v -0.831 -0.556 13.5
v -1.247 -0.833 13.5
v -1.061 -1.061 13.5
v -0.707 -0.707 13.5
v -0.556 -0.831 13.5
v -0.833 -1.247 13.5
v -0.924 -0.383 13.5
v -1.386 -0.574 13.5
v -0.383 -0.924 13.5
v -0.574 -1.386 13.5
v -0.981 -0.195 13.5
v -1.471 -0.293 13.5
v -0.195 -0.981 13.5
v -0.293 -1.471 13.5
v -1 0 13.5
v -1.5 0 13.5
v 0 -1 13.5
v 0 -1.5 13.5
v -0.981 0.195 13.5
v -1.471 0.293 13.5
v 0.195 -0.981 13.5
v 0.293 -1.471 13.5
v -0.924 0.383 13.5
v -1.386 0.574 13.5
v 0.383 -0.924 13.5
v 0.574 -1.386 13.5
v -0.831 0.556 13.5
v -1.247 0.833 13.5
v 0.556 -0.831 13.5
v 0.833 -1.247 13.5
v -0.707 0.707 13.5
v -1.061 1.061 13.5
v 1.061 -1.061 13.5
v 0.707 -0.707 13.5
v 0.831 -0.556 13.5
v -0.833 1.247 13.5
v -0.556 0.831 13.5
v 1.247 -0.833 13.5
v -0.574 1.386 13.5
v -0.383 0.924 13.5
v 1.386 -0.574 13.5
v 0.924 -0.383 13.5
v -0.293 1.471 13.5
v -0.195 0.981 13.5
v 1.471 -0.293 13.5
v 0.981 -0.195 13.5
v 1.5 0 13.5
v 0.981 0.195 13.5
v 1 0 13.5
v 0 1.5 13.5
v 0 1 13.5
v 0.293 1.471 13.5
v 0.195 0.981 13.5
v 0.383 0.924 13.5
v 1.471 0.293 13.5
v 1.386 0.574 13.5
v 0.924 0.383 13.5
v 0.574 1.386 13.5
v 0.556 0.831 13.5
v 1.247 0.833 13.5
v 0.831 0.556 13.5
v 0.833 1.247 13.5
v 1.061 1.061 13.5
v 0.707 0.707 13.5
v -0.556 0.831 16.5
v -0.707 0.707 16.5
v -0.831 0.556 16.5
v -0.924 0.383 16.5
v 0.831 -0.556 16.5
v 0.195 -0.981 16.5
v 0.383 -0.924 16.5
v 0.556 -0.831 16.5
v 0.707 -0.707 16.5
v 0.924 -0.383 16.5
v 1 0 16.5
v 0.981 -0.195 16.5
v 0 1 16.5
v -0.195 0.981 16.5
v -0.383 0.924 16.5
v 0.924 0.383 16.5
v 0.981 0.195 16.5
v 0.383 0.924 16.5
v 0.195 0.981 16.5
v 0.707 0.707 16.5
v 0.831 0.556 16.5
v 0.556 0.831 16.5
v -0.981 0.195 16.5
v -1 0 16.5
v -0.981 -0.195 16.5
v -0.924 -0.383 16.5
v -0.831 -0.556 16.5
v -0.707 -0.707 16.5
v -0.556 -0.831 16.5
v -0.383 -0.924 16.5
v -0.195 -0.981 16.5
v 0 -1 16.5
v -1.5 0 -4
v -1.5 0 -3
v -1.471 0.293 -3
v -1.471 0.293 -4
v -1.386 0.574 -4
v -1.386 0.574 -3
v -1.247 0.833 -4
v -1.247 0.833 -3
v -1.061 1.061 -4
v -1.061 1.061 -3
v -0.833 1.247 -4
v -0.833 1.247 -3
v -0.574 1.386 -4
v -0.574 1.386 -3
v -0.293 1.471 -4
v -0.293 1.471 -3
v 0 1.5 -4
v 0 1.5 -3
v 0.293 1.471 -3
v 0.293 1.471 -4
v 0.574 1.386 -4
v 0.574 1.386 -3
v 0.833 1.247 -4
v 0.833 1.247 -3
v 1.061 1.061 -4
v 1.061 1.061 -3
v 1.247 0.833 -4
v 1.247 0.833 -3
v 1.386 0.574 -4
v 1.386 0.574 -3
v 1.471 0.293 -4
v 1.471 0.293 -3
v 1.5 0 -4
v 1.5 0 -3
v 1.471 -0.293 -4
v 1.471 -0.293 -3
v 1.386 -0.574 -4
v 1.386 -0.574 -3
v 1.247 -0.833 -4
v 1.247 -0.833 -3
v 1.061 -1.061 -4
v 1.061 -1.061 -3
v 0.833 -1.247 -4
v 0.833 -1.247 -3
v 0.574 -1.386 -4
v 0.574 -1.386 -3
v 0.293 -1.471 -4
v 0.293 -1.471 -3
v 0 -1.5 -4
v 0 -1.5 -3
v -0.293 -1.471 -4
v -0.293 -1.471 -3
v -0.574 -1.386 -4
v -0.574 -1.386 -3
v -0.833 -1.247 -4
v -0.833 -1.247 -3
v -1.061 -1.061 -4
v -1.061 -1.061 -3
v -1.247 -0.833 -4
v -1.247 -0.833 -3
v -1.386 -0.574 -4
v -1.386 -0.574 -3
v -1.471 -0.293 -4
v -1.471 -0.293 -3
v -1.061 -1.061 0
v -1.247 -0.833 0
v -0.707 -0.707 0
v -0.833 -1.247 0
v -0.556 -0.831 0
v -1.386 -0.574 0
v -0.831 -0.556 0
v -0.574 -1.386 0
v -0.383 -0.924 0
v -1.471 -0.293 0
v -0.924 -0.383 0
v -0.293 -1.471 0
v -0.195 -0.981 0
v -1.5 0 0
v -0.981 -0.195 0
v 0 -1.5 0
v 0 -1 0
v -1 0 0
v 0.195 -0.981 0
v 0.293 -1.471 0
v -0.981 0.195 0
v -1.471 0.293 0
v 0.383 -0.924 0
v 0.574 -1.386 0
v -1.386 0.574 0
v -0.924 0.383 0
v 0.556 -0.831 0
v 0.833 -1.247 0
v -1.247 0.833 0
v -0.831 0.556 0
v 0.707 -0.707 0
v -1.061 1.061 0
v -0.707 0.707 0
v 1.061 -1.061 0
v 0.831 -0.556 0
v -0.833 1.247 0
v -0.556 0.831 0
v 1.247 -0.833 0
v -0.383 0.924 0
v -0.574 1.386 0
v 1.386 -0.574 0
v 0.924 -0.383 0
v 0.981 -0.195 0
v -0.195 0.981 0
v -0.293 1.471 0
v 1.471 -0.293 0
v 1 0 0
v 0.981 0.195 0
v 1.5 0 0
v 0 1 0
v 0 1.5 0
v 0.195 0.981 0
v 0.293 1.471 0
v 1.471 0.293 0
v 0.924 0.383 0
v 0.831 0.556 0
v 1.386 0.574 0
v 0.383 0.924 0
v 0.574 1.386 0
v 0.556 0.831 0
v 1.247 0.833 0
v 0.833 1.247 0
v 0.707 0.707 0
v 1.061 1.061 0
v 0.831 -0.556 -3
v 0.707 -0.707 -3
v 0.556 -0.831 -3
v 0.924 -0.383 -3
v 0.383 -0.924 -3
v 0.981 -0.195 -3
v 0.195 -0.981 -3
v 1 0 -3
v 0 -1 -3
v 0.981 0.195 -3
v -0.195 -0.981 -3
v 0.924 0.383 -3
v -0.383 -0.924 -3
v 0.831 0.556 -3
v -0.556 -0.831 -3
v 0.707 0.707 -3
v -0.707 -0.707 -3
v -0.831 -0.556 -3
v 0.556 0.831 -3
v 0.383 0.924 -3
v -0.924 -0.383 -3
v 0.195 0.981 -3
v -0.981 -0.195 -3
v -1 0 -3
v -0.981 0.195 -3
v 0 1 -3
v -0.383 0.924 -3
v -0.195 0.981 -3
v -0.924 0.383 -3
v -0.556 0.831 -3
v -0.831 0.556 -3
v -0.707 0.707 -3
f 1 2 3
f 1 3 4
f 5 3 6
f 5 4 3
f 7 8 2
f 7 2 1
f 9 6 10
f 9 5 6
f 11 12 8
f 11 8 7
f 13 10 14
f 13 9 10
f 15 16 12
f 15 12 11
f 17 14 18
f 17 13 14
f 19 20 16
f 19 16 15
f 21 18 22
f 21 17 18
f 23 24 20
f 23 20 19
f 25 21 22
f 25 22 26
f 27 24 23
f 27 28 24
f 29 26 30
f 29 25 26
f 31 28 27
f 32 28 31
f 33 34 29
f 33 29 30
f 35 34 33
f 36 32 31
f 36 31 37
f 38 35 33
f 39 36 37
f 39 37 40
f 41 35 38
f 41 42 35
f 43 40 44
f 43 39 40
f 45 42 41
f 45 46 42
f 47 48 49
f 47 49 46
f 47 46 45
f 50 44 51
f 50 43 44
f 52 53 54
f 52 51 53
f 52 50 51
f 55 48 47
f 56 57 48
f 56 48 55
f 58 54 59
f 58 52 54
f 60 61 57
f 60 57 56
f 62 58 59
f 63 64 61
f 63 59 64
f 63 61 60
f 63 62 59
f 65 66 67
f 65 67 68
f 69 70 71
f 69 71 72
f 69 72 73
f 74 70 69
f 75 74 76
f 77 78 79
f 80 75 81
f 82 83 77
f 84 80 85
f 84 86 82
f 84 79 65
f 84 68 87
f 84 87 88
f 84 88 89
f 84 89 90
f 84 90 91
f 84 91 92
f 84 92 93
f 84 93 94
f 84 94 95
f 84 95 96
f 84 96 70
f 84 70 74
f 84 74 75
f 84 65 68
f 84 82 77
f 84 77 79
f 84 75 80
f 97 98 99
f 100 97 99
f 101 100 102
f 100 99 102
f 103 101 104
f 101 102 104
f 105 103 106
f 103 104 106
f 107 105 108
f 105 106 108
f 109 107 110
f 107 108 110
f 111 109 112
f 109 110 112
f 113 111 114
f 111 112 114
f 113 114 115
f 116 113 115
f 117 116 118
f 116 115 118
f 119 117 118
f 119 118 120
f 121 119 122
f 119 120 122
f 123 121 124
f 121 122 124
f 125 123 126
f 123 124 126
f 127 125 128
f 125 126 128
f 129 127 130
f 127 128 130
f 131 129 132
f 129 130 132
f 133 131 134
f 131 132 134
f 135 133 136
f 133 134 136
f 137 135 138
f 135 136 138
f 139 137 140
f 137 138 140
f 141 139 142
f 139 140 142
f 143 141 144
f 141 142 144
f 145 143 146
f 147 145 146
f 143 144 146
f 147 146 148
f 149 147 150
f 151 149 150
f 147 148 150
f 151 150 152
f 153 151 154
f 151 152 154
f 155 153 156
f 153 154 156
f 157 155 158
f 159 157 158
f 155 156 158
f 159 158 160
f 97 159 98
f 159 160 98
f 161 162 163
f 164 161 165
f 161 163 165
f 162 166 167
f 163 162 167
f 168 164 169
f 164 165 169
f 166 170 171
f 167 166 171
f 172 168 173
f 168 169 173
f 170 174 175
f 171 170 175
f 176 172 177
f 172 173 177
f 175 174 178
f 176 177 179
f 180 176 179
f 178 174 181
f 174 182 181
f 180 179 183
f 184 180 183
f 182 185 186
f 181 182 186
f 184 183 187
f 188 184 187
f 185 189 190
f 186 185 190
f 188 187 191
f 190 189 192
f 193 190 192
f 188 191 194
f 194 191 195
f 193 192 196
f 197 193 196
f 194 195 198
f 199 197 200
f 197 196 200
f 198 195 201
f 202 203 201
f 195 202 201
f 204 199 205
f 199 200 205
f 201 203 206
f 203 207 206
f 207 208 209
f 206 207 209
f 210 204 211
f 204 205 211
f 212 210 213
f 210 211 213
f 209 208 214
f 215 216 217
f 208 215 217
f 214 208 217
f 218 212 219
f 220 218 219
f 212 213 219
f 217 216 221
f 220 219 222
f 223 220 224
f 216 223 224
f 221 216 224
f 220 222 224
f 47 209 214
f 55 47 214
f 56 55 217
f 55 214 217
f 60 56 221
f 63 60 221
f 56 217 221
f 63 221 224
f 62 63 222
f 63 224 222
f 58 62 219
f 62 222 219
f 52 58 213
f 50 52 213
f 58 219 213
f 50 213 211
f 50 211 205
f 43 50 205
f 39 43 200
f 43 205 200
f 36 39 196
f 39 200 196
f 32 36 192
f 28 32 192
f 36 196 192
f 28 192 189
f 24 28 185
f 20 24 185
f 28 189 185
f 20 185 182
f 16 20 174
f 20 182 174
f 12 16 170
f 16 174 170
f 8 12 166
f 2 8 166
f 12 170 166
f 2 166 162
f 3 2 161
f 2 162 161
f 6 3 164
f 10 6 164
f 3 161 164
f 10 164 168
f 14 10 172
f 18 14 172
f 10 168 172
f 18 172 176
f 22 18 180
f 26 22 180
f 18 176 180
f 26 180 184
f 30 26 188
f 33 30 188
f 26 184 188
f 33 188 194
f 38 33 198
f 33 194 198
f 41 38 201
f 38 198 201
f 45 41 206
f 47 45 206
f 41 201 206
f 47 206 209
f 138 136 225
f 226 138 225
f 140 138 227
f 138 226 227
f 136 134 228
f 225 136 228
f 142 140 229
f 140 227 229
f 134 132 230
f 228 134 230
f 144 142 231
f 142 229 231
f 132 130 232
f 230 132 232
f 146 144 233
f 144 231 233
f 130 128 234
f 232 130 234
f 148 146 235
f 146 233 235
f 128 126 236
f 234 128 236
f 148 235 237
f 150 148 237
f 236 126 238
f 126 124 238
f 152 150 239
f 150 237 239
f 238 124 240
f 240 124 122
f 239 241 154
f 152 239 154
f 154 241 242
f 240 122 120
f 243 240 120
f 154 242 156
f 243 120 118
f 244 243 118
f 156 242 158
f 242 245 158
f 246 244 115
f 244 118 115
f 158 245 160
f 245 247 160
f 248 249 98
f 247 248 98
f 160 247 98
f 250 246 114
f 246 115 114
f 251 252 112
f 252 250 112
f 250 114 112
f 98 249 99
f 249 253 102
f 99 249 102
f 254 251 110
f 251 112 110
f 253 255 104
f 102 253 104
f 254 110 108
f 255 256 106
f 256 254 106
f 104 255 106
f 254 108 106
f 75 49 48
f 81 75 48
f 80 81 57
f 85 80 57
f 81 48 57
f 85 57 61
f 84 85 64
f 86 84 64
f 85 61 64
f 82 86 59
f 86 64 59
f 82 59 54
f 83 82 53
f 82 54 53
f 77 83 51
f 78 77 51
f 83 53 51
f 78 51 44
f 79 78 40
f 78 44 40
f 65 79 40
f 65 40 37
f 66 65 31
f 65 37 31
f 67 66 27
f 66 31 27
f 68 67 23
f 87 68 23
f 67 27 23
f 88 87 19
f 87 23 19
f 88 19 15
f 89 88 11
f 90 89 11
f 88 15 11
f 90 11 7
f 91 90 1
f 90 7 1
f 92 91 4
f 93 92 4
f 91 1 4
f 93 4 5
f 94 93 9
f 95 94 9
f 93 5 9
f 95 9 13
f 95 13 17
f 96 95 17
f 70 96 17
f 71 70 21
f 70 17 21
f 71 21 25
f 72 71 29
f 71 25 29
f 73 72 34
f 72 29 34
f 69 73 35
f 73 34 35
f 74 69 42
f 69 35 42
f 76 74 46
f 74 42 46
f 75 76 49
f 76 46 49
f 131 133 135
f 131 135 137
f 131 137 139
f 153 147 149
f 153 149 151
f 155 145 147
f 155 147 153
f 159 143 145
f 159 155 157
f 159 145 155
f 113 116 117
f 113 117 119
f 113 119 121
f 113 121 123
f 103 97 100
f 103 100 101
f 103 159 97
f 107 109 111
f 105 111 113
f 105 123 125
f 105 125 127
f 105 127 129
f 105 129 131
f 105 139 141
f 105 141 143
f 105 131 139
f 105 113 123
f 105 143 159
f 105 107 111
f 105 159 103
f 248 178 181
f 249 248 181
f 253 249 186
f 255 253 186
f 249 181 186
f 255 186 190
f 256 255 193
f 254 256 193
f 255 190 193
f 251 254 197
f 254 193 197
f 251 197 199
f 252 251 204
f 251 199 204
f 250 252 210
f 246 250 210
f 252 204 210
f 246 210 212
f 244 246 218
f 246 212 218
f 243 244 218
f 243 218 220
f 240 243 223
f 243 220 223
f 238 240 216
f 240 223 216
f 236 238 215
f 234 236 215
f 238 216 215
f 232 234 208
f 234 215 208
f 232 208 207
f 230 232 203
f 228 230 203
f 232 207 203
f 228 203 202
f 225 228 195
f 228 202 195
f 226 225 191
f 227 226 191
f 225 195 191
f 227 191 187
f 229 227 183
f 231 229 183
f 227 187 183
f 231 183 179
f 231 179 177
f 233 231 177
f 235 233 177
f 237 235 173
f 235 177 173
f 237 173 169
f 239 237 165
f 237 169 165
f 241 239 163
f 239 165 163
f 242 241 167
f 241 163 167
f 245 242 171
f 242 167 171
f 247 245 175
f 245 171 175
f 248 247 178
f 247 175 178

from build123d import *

# Parameters (mm, degrees)
SKETCH_1_R      = 1.5
EXTRUDE_1_DEPTH = 13.5
SKETCH_2_R      = 1
EXTRUDE_2_DEPTH = 3
SKETCH_3_R      = 1
EXTRUDE_3_DEPTH = 3
SKETCH_4_R      = 1.5
EXTRUDE_4_DEPTH = 1


with BuildPart() as part:
    # 草图1 → 凸台-拉伸1 (new body)
    with BuildSketch(Plane.XY):
        Circle(SKETCH_1_R)
    extrude(amount=EXTRUDE_1_DEPTH)

    # 草图2 → 凸台-拉伸2 (add)
    with BuildSketch(Plane.XY.offset(13.5)):
        Circle(SKETCH_2_R)
    extrude(amount=EXTRUDE_2_DEPTH)

    # 草图3 → 凸台-拉伸3 (add)
    with BuildSketch(Plane(origin=(0, 0, 0), x_dir=(-1, 0, 0), z_dir=(0, 0, -1))):
        Circle(SKETCH_3_R)
    extrude(amount=EXTRUDE_3_DEPTH)

    # 草图4 → 凸台-拉伸4 (add)
    with BuildSketch(Plane(origin=(0, 0, -3), x_dir=(-1, 0, 0), z_dir=(0, 0, -1))):
        Circle(SKETCH_4_R)
    extrude(amount=EXTRUDE_4_DEPTH)


solid = part.part
